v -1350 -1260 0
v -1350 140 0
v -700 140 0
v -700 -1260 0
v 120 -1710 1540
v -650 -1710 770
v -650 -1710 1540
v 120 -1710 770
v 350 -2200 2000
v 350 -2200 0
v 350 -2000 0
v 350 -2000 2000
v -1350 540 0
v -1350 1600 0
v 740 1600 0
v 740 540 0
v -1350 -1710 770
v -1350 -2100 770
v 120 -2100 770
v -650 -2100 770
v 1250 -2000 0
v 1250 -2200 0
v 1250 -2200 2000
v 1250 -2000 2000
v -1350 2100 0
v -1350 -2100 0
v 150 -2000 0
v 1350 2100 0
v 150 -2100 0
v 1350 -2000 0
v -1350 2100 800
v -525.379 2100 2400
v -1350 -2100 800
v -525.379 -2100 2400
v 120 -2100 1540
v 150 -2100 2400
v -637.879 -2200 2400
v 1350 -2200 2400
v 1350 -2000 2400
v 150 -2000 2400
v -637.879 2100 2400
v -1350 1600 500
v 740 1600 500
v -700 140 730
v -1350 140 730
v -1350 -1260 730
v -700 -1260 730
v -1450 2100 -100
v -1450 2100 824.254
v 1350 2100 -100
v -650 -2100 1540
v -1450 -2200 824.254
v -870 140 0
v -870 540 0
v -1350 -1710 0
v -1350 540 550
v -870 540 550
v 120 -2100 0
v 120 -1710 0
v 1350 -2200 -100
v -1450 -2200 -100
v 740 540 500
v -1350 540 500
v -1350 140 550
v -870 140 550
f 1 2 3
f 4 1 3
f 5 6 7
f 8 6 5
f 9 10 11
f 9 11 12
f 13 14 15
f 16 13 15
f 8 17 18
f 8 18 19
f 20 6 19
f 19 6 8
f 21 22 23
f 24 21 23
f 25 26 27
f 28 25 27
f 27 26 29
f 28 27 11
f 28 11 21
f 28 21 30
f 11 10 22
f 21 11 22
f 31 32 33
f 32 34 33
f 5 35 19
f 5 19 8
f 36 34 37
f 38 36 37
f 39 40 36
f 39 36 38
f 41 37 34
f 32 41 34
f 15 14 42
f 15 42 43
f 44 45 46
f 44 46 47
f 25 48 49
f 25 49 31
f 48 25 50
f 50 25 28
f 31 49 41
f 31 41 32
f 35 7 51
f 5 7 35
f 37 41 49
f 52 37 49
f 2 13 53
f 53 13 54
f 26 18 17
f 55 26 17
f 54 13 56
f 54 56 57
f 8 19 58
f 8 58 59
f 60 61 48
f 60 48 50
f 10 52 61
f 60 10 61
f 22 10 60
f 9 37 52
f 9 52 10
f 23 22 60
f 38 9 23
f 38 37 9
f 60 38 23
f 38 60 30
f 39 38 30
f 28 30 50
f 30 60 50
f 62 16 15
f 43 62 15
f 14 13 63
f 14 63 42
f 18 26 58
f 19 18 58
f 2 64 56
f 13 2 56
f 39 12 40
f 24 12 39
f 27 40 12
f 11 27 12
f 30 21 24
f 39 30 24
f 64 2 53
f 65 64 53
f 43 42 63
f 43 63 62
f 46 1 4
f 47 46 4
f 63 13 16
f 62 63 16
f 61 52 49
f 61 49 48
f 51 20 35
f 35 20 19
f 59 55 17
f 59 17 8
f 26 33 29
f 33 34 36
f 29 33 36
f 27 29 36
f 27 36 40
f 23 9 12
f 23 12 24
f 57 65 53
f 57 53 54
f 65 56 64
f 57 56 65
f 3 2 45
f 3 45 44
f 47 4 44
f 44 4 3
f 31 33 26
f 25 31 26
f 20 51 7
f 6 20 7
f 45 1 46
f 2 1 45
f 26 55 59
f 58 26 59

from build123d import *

# Parameters (mm, degrees)
F1_DEPTH  = 2100
F2_T      = 100
F3_W      = 2090
F3_H      = 1060
F4_DEPTH  = 500
F5_W      = 1200
F5_H      = 100
F6_DEPTH  = 2400
F7_W      = 900
F7_H      = 2000
F8_DEPTH  = 1000
F9_W      = 1470
F9_H      = 390
F10_DEPTH = 770
F11_W     = 770
F11_H     = 390
F12_DEPTH = 770
F13_W     = 480
F13_H     = 400
F14_DEPTH = 550
F15_W     = 650
F15_H     = 1400
F16_DEPTH = 730


with BuildPart() as f1:
    # F0 (on Front) → F1 (new body, symmetric)
    with BuildSketch(Plane.XZ):
        Polygon((-525.3788748765, 2400), (-1350, 800), (-1350, 0), (1350, 0), (1350, 2400), align=None)
    extrude(amount=F1_DEPTH, both=True)

    # F2
    f2_openings = [f1.faces().sort_by_distance(p)[0] for p in [
        (121.8592, 2100, 1124.43728),
        (412.310563, 0, 2400),
        (1350, 0, 1200),
    ]]
    offset(amount=F2_T, openings=f2_openings, kind=Kind.INTERSECTION)

    # F5 (on face) → F6 (join, through all)
    with BuildSketch(Plane.XY):
        with Locations((750, -2050)):
            Rectangle(F5_W, F5_H)
    extrude(amount=F6_DEPTH)

    # F7 (on face) → F8 (cut)
    with BuildSketch(Plane.XZ.offset(2200)):
        with Locations((800, 1000)):
            Rectangle(F7_W, F7_H)
    extrude(amount=-F8_DEPTH, mode=Mode.SUBTRACT)


with BuildPart() as f4:
    # F3 (on face) → F4 (new body)
    with BuildSketch(Plane.XY):
        with Locations((-305, 1070)):
            Rectangle(F3_W, F3_H)
    extrude(amount=F4_DEPTH)


with BuildPart() as f10:
    # F9 (on face) → F10 (new body)
    with BuildSketch(Plane.XY):
        with Locations((-615, -1905)):
            Rectangle(F9_W, F9_H)
    extrude(amount=F10_DEPTH)


with BuildPart() as f12:
    # F11 (on face) → F12 (new body)
    with BuildSketch(Plane.XY.offset(770)):
        with Locations((-265, -1905)):
            Rectangle(F11_W, F11_H)
    extrude(amount=F12_DEPTH)


with BuildPart() as f14:
    # F13 (on face) → F14 (new body)
    with BuildSketch(Plane.XY):
        with Locations((-1110, 340)):
            Rectangle(F13_W, F13_H)
    extrude(amount=F14_DEPTH)


with BuildPart() as f16:
    # F15 (on face) → F16 (new body)
    with BuildSketch(Plane.XY):
        with Locations((-1025, -560)):
            Rectangle(F15_W, F15_H)
    extrude(amount=F16_DEPTH)


solid = Compound([f1.part, f4.part, f10.part, f12.part, f14.part, f16.part])
